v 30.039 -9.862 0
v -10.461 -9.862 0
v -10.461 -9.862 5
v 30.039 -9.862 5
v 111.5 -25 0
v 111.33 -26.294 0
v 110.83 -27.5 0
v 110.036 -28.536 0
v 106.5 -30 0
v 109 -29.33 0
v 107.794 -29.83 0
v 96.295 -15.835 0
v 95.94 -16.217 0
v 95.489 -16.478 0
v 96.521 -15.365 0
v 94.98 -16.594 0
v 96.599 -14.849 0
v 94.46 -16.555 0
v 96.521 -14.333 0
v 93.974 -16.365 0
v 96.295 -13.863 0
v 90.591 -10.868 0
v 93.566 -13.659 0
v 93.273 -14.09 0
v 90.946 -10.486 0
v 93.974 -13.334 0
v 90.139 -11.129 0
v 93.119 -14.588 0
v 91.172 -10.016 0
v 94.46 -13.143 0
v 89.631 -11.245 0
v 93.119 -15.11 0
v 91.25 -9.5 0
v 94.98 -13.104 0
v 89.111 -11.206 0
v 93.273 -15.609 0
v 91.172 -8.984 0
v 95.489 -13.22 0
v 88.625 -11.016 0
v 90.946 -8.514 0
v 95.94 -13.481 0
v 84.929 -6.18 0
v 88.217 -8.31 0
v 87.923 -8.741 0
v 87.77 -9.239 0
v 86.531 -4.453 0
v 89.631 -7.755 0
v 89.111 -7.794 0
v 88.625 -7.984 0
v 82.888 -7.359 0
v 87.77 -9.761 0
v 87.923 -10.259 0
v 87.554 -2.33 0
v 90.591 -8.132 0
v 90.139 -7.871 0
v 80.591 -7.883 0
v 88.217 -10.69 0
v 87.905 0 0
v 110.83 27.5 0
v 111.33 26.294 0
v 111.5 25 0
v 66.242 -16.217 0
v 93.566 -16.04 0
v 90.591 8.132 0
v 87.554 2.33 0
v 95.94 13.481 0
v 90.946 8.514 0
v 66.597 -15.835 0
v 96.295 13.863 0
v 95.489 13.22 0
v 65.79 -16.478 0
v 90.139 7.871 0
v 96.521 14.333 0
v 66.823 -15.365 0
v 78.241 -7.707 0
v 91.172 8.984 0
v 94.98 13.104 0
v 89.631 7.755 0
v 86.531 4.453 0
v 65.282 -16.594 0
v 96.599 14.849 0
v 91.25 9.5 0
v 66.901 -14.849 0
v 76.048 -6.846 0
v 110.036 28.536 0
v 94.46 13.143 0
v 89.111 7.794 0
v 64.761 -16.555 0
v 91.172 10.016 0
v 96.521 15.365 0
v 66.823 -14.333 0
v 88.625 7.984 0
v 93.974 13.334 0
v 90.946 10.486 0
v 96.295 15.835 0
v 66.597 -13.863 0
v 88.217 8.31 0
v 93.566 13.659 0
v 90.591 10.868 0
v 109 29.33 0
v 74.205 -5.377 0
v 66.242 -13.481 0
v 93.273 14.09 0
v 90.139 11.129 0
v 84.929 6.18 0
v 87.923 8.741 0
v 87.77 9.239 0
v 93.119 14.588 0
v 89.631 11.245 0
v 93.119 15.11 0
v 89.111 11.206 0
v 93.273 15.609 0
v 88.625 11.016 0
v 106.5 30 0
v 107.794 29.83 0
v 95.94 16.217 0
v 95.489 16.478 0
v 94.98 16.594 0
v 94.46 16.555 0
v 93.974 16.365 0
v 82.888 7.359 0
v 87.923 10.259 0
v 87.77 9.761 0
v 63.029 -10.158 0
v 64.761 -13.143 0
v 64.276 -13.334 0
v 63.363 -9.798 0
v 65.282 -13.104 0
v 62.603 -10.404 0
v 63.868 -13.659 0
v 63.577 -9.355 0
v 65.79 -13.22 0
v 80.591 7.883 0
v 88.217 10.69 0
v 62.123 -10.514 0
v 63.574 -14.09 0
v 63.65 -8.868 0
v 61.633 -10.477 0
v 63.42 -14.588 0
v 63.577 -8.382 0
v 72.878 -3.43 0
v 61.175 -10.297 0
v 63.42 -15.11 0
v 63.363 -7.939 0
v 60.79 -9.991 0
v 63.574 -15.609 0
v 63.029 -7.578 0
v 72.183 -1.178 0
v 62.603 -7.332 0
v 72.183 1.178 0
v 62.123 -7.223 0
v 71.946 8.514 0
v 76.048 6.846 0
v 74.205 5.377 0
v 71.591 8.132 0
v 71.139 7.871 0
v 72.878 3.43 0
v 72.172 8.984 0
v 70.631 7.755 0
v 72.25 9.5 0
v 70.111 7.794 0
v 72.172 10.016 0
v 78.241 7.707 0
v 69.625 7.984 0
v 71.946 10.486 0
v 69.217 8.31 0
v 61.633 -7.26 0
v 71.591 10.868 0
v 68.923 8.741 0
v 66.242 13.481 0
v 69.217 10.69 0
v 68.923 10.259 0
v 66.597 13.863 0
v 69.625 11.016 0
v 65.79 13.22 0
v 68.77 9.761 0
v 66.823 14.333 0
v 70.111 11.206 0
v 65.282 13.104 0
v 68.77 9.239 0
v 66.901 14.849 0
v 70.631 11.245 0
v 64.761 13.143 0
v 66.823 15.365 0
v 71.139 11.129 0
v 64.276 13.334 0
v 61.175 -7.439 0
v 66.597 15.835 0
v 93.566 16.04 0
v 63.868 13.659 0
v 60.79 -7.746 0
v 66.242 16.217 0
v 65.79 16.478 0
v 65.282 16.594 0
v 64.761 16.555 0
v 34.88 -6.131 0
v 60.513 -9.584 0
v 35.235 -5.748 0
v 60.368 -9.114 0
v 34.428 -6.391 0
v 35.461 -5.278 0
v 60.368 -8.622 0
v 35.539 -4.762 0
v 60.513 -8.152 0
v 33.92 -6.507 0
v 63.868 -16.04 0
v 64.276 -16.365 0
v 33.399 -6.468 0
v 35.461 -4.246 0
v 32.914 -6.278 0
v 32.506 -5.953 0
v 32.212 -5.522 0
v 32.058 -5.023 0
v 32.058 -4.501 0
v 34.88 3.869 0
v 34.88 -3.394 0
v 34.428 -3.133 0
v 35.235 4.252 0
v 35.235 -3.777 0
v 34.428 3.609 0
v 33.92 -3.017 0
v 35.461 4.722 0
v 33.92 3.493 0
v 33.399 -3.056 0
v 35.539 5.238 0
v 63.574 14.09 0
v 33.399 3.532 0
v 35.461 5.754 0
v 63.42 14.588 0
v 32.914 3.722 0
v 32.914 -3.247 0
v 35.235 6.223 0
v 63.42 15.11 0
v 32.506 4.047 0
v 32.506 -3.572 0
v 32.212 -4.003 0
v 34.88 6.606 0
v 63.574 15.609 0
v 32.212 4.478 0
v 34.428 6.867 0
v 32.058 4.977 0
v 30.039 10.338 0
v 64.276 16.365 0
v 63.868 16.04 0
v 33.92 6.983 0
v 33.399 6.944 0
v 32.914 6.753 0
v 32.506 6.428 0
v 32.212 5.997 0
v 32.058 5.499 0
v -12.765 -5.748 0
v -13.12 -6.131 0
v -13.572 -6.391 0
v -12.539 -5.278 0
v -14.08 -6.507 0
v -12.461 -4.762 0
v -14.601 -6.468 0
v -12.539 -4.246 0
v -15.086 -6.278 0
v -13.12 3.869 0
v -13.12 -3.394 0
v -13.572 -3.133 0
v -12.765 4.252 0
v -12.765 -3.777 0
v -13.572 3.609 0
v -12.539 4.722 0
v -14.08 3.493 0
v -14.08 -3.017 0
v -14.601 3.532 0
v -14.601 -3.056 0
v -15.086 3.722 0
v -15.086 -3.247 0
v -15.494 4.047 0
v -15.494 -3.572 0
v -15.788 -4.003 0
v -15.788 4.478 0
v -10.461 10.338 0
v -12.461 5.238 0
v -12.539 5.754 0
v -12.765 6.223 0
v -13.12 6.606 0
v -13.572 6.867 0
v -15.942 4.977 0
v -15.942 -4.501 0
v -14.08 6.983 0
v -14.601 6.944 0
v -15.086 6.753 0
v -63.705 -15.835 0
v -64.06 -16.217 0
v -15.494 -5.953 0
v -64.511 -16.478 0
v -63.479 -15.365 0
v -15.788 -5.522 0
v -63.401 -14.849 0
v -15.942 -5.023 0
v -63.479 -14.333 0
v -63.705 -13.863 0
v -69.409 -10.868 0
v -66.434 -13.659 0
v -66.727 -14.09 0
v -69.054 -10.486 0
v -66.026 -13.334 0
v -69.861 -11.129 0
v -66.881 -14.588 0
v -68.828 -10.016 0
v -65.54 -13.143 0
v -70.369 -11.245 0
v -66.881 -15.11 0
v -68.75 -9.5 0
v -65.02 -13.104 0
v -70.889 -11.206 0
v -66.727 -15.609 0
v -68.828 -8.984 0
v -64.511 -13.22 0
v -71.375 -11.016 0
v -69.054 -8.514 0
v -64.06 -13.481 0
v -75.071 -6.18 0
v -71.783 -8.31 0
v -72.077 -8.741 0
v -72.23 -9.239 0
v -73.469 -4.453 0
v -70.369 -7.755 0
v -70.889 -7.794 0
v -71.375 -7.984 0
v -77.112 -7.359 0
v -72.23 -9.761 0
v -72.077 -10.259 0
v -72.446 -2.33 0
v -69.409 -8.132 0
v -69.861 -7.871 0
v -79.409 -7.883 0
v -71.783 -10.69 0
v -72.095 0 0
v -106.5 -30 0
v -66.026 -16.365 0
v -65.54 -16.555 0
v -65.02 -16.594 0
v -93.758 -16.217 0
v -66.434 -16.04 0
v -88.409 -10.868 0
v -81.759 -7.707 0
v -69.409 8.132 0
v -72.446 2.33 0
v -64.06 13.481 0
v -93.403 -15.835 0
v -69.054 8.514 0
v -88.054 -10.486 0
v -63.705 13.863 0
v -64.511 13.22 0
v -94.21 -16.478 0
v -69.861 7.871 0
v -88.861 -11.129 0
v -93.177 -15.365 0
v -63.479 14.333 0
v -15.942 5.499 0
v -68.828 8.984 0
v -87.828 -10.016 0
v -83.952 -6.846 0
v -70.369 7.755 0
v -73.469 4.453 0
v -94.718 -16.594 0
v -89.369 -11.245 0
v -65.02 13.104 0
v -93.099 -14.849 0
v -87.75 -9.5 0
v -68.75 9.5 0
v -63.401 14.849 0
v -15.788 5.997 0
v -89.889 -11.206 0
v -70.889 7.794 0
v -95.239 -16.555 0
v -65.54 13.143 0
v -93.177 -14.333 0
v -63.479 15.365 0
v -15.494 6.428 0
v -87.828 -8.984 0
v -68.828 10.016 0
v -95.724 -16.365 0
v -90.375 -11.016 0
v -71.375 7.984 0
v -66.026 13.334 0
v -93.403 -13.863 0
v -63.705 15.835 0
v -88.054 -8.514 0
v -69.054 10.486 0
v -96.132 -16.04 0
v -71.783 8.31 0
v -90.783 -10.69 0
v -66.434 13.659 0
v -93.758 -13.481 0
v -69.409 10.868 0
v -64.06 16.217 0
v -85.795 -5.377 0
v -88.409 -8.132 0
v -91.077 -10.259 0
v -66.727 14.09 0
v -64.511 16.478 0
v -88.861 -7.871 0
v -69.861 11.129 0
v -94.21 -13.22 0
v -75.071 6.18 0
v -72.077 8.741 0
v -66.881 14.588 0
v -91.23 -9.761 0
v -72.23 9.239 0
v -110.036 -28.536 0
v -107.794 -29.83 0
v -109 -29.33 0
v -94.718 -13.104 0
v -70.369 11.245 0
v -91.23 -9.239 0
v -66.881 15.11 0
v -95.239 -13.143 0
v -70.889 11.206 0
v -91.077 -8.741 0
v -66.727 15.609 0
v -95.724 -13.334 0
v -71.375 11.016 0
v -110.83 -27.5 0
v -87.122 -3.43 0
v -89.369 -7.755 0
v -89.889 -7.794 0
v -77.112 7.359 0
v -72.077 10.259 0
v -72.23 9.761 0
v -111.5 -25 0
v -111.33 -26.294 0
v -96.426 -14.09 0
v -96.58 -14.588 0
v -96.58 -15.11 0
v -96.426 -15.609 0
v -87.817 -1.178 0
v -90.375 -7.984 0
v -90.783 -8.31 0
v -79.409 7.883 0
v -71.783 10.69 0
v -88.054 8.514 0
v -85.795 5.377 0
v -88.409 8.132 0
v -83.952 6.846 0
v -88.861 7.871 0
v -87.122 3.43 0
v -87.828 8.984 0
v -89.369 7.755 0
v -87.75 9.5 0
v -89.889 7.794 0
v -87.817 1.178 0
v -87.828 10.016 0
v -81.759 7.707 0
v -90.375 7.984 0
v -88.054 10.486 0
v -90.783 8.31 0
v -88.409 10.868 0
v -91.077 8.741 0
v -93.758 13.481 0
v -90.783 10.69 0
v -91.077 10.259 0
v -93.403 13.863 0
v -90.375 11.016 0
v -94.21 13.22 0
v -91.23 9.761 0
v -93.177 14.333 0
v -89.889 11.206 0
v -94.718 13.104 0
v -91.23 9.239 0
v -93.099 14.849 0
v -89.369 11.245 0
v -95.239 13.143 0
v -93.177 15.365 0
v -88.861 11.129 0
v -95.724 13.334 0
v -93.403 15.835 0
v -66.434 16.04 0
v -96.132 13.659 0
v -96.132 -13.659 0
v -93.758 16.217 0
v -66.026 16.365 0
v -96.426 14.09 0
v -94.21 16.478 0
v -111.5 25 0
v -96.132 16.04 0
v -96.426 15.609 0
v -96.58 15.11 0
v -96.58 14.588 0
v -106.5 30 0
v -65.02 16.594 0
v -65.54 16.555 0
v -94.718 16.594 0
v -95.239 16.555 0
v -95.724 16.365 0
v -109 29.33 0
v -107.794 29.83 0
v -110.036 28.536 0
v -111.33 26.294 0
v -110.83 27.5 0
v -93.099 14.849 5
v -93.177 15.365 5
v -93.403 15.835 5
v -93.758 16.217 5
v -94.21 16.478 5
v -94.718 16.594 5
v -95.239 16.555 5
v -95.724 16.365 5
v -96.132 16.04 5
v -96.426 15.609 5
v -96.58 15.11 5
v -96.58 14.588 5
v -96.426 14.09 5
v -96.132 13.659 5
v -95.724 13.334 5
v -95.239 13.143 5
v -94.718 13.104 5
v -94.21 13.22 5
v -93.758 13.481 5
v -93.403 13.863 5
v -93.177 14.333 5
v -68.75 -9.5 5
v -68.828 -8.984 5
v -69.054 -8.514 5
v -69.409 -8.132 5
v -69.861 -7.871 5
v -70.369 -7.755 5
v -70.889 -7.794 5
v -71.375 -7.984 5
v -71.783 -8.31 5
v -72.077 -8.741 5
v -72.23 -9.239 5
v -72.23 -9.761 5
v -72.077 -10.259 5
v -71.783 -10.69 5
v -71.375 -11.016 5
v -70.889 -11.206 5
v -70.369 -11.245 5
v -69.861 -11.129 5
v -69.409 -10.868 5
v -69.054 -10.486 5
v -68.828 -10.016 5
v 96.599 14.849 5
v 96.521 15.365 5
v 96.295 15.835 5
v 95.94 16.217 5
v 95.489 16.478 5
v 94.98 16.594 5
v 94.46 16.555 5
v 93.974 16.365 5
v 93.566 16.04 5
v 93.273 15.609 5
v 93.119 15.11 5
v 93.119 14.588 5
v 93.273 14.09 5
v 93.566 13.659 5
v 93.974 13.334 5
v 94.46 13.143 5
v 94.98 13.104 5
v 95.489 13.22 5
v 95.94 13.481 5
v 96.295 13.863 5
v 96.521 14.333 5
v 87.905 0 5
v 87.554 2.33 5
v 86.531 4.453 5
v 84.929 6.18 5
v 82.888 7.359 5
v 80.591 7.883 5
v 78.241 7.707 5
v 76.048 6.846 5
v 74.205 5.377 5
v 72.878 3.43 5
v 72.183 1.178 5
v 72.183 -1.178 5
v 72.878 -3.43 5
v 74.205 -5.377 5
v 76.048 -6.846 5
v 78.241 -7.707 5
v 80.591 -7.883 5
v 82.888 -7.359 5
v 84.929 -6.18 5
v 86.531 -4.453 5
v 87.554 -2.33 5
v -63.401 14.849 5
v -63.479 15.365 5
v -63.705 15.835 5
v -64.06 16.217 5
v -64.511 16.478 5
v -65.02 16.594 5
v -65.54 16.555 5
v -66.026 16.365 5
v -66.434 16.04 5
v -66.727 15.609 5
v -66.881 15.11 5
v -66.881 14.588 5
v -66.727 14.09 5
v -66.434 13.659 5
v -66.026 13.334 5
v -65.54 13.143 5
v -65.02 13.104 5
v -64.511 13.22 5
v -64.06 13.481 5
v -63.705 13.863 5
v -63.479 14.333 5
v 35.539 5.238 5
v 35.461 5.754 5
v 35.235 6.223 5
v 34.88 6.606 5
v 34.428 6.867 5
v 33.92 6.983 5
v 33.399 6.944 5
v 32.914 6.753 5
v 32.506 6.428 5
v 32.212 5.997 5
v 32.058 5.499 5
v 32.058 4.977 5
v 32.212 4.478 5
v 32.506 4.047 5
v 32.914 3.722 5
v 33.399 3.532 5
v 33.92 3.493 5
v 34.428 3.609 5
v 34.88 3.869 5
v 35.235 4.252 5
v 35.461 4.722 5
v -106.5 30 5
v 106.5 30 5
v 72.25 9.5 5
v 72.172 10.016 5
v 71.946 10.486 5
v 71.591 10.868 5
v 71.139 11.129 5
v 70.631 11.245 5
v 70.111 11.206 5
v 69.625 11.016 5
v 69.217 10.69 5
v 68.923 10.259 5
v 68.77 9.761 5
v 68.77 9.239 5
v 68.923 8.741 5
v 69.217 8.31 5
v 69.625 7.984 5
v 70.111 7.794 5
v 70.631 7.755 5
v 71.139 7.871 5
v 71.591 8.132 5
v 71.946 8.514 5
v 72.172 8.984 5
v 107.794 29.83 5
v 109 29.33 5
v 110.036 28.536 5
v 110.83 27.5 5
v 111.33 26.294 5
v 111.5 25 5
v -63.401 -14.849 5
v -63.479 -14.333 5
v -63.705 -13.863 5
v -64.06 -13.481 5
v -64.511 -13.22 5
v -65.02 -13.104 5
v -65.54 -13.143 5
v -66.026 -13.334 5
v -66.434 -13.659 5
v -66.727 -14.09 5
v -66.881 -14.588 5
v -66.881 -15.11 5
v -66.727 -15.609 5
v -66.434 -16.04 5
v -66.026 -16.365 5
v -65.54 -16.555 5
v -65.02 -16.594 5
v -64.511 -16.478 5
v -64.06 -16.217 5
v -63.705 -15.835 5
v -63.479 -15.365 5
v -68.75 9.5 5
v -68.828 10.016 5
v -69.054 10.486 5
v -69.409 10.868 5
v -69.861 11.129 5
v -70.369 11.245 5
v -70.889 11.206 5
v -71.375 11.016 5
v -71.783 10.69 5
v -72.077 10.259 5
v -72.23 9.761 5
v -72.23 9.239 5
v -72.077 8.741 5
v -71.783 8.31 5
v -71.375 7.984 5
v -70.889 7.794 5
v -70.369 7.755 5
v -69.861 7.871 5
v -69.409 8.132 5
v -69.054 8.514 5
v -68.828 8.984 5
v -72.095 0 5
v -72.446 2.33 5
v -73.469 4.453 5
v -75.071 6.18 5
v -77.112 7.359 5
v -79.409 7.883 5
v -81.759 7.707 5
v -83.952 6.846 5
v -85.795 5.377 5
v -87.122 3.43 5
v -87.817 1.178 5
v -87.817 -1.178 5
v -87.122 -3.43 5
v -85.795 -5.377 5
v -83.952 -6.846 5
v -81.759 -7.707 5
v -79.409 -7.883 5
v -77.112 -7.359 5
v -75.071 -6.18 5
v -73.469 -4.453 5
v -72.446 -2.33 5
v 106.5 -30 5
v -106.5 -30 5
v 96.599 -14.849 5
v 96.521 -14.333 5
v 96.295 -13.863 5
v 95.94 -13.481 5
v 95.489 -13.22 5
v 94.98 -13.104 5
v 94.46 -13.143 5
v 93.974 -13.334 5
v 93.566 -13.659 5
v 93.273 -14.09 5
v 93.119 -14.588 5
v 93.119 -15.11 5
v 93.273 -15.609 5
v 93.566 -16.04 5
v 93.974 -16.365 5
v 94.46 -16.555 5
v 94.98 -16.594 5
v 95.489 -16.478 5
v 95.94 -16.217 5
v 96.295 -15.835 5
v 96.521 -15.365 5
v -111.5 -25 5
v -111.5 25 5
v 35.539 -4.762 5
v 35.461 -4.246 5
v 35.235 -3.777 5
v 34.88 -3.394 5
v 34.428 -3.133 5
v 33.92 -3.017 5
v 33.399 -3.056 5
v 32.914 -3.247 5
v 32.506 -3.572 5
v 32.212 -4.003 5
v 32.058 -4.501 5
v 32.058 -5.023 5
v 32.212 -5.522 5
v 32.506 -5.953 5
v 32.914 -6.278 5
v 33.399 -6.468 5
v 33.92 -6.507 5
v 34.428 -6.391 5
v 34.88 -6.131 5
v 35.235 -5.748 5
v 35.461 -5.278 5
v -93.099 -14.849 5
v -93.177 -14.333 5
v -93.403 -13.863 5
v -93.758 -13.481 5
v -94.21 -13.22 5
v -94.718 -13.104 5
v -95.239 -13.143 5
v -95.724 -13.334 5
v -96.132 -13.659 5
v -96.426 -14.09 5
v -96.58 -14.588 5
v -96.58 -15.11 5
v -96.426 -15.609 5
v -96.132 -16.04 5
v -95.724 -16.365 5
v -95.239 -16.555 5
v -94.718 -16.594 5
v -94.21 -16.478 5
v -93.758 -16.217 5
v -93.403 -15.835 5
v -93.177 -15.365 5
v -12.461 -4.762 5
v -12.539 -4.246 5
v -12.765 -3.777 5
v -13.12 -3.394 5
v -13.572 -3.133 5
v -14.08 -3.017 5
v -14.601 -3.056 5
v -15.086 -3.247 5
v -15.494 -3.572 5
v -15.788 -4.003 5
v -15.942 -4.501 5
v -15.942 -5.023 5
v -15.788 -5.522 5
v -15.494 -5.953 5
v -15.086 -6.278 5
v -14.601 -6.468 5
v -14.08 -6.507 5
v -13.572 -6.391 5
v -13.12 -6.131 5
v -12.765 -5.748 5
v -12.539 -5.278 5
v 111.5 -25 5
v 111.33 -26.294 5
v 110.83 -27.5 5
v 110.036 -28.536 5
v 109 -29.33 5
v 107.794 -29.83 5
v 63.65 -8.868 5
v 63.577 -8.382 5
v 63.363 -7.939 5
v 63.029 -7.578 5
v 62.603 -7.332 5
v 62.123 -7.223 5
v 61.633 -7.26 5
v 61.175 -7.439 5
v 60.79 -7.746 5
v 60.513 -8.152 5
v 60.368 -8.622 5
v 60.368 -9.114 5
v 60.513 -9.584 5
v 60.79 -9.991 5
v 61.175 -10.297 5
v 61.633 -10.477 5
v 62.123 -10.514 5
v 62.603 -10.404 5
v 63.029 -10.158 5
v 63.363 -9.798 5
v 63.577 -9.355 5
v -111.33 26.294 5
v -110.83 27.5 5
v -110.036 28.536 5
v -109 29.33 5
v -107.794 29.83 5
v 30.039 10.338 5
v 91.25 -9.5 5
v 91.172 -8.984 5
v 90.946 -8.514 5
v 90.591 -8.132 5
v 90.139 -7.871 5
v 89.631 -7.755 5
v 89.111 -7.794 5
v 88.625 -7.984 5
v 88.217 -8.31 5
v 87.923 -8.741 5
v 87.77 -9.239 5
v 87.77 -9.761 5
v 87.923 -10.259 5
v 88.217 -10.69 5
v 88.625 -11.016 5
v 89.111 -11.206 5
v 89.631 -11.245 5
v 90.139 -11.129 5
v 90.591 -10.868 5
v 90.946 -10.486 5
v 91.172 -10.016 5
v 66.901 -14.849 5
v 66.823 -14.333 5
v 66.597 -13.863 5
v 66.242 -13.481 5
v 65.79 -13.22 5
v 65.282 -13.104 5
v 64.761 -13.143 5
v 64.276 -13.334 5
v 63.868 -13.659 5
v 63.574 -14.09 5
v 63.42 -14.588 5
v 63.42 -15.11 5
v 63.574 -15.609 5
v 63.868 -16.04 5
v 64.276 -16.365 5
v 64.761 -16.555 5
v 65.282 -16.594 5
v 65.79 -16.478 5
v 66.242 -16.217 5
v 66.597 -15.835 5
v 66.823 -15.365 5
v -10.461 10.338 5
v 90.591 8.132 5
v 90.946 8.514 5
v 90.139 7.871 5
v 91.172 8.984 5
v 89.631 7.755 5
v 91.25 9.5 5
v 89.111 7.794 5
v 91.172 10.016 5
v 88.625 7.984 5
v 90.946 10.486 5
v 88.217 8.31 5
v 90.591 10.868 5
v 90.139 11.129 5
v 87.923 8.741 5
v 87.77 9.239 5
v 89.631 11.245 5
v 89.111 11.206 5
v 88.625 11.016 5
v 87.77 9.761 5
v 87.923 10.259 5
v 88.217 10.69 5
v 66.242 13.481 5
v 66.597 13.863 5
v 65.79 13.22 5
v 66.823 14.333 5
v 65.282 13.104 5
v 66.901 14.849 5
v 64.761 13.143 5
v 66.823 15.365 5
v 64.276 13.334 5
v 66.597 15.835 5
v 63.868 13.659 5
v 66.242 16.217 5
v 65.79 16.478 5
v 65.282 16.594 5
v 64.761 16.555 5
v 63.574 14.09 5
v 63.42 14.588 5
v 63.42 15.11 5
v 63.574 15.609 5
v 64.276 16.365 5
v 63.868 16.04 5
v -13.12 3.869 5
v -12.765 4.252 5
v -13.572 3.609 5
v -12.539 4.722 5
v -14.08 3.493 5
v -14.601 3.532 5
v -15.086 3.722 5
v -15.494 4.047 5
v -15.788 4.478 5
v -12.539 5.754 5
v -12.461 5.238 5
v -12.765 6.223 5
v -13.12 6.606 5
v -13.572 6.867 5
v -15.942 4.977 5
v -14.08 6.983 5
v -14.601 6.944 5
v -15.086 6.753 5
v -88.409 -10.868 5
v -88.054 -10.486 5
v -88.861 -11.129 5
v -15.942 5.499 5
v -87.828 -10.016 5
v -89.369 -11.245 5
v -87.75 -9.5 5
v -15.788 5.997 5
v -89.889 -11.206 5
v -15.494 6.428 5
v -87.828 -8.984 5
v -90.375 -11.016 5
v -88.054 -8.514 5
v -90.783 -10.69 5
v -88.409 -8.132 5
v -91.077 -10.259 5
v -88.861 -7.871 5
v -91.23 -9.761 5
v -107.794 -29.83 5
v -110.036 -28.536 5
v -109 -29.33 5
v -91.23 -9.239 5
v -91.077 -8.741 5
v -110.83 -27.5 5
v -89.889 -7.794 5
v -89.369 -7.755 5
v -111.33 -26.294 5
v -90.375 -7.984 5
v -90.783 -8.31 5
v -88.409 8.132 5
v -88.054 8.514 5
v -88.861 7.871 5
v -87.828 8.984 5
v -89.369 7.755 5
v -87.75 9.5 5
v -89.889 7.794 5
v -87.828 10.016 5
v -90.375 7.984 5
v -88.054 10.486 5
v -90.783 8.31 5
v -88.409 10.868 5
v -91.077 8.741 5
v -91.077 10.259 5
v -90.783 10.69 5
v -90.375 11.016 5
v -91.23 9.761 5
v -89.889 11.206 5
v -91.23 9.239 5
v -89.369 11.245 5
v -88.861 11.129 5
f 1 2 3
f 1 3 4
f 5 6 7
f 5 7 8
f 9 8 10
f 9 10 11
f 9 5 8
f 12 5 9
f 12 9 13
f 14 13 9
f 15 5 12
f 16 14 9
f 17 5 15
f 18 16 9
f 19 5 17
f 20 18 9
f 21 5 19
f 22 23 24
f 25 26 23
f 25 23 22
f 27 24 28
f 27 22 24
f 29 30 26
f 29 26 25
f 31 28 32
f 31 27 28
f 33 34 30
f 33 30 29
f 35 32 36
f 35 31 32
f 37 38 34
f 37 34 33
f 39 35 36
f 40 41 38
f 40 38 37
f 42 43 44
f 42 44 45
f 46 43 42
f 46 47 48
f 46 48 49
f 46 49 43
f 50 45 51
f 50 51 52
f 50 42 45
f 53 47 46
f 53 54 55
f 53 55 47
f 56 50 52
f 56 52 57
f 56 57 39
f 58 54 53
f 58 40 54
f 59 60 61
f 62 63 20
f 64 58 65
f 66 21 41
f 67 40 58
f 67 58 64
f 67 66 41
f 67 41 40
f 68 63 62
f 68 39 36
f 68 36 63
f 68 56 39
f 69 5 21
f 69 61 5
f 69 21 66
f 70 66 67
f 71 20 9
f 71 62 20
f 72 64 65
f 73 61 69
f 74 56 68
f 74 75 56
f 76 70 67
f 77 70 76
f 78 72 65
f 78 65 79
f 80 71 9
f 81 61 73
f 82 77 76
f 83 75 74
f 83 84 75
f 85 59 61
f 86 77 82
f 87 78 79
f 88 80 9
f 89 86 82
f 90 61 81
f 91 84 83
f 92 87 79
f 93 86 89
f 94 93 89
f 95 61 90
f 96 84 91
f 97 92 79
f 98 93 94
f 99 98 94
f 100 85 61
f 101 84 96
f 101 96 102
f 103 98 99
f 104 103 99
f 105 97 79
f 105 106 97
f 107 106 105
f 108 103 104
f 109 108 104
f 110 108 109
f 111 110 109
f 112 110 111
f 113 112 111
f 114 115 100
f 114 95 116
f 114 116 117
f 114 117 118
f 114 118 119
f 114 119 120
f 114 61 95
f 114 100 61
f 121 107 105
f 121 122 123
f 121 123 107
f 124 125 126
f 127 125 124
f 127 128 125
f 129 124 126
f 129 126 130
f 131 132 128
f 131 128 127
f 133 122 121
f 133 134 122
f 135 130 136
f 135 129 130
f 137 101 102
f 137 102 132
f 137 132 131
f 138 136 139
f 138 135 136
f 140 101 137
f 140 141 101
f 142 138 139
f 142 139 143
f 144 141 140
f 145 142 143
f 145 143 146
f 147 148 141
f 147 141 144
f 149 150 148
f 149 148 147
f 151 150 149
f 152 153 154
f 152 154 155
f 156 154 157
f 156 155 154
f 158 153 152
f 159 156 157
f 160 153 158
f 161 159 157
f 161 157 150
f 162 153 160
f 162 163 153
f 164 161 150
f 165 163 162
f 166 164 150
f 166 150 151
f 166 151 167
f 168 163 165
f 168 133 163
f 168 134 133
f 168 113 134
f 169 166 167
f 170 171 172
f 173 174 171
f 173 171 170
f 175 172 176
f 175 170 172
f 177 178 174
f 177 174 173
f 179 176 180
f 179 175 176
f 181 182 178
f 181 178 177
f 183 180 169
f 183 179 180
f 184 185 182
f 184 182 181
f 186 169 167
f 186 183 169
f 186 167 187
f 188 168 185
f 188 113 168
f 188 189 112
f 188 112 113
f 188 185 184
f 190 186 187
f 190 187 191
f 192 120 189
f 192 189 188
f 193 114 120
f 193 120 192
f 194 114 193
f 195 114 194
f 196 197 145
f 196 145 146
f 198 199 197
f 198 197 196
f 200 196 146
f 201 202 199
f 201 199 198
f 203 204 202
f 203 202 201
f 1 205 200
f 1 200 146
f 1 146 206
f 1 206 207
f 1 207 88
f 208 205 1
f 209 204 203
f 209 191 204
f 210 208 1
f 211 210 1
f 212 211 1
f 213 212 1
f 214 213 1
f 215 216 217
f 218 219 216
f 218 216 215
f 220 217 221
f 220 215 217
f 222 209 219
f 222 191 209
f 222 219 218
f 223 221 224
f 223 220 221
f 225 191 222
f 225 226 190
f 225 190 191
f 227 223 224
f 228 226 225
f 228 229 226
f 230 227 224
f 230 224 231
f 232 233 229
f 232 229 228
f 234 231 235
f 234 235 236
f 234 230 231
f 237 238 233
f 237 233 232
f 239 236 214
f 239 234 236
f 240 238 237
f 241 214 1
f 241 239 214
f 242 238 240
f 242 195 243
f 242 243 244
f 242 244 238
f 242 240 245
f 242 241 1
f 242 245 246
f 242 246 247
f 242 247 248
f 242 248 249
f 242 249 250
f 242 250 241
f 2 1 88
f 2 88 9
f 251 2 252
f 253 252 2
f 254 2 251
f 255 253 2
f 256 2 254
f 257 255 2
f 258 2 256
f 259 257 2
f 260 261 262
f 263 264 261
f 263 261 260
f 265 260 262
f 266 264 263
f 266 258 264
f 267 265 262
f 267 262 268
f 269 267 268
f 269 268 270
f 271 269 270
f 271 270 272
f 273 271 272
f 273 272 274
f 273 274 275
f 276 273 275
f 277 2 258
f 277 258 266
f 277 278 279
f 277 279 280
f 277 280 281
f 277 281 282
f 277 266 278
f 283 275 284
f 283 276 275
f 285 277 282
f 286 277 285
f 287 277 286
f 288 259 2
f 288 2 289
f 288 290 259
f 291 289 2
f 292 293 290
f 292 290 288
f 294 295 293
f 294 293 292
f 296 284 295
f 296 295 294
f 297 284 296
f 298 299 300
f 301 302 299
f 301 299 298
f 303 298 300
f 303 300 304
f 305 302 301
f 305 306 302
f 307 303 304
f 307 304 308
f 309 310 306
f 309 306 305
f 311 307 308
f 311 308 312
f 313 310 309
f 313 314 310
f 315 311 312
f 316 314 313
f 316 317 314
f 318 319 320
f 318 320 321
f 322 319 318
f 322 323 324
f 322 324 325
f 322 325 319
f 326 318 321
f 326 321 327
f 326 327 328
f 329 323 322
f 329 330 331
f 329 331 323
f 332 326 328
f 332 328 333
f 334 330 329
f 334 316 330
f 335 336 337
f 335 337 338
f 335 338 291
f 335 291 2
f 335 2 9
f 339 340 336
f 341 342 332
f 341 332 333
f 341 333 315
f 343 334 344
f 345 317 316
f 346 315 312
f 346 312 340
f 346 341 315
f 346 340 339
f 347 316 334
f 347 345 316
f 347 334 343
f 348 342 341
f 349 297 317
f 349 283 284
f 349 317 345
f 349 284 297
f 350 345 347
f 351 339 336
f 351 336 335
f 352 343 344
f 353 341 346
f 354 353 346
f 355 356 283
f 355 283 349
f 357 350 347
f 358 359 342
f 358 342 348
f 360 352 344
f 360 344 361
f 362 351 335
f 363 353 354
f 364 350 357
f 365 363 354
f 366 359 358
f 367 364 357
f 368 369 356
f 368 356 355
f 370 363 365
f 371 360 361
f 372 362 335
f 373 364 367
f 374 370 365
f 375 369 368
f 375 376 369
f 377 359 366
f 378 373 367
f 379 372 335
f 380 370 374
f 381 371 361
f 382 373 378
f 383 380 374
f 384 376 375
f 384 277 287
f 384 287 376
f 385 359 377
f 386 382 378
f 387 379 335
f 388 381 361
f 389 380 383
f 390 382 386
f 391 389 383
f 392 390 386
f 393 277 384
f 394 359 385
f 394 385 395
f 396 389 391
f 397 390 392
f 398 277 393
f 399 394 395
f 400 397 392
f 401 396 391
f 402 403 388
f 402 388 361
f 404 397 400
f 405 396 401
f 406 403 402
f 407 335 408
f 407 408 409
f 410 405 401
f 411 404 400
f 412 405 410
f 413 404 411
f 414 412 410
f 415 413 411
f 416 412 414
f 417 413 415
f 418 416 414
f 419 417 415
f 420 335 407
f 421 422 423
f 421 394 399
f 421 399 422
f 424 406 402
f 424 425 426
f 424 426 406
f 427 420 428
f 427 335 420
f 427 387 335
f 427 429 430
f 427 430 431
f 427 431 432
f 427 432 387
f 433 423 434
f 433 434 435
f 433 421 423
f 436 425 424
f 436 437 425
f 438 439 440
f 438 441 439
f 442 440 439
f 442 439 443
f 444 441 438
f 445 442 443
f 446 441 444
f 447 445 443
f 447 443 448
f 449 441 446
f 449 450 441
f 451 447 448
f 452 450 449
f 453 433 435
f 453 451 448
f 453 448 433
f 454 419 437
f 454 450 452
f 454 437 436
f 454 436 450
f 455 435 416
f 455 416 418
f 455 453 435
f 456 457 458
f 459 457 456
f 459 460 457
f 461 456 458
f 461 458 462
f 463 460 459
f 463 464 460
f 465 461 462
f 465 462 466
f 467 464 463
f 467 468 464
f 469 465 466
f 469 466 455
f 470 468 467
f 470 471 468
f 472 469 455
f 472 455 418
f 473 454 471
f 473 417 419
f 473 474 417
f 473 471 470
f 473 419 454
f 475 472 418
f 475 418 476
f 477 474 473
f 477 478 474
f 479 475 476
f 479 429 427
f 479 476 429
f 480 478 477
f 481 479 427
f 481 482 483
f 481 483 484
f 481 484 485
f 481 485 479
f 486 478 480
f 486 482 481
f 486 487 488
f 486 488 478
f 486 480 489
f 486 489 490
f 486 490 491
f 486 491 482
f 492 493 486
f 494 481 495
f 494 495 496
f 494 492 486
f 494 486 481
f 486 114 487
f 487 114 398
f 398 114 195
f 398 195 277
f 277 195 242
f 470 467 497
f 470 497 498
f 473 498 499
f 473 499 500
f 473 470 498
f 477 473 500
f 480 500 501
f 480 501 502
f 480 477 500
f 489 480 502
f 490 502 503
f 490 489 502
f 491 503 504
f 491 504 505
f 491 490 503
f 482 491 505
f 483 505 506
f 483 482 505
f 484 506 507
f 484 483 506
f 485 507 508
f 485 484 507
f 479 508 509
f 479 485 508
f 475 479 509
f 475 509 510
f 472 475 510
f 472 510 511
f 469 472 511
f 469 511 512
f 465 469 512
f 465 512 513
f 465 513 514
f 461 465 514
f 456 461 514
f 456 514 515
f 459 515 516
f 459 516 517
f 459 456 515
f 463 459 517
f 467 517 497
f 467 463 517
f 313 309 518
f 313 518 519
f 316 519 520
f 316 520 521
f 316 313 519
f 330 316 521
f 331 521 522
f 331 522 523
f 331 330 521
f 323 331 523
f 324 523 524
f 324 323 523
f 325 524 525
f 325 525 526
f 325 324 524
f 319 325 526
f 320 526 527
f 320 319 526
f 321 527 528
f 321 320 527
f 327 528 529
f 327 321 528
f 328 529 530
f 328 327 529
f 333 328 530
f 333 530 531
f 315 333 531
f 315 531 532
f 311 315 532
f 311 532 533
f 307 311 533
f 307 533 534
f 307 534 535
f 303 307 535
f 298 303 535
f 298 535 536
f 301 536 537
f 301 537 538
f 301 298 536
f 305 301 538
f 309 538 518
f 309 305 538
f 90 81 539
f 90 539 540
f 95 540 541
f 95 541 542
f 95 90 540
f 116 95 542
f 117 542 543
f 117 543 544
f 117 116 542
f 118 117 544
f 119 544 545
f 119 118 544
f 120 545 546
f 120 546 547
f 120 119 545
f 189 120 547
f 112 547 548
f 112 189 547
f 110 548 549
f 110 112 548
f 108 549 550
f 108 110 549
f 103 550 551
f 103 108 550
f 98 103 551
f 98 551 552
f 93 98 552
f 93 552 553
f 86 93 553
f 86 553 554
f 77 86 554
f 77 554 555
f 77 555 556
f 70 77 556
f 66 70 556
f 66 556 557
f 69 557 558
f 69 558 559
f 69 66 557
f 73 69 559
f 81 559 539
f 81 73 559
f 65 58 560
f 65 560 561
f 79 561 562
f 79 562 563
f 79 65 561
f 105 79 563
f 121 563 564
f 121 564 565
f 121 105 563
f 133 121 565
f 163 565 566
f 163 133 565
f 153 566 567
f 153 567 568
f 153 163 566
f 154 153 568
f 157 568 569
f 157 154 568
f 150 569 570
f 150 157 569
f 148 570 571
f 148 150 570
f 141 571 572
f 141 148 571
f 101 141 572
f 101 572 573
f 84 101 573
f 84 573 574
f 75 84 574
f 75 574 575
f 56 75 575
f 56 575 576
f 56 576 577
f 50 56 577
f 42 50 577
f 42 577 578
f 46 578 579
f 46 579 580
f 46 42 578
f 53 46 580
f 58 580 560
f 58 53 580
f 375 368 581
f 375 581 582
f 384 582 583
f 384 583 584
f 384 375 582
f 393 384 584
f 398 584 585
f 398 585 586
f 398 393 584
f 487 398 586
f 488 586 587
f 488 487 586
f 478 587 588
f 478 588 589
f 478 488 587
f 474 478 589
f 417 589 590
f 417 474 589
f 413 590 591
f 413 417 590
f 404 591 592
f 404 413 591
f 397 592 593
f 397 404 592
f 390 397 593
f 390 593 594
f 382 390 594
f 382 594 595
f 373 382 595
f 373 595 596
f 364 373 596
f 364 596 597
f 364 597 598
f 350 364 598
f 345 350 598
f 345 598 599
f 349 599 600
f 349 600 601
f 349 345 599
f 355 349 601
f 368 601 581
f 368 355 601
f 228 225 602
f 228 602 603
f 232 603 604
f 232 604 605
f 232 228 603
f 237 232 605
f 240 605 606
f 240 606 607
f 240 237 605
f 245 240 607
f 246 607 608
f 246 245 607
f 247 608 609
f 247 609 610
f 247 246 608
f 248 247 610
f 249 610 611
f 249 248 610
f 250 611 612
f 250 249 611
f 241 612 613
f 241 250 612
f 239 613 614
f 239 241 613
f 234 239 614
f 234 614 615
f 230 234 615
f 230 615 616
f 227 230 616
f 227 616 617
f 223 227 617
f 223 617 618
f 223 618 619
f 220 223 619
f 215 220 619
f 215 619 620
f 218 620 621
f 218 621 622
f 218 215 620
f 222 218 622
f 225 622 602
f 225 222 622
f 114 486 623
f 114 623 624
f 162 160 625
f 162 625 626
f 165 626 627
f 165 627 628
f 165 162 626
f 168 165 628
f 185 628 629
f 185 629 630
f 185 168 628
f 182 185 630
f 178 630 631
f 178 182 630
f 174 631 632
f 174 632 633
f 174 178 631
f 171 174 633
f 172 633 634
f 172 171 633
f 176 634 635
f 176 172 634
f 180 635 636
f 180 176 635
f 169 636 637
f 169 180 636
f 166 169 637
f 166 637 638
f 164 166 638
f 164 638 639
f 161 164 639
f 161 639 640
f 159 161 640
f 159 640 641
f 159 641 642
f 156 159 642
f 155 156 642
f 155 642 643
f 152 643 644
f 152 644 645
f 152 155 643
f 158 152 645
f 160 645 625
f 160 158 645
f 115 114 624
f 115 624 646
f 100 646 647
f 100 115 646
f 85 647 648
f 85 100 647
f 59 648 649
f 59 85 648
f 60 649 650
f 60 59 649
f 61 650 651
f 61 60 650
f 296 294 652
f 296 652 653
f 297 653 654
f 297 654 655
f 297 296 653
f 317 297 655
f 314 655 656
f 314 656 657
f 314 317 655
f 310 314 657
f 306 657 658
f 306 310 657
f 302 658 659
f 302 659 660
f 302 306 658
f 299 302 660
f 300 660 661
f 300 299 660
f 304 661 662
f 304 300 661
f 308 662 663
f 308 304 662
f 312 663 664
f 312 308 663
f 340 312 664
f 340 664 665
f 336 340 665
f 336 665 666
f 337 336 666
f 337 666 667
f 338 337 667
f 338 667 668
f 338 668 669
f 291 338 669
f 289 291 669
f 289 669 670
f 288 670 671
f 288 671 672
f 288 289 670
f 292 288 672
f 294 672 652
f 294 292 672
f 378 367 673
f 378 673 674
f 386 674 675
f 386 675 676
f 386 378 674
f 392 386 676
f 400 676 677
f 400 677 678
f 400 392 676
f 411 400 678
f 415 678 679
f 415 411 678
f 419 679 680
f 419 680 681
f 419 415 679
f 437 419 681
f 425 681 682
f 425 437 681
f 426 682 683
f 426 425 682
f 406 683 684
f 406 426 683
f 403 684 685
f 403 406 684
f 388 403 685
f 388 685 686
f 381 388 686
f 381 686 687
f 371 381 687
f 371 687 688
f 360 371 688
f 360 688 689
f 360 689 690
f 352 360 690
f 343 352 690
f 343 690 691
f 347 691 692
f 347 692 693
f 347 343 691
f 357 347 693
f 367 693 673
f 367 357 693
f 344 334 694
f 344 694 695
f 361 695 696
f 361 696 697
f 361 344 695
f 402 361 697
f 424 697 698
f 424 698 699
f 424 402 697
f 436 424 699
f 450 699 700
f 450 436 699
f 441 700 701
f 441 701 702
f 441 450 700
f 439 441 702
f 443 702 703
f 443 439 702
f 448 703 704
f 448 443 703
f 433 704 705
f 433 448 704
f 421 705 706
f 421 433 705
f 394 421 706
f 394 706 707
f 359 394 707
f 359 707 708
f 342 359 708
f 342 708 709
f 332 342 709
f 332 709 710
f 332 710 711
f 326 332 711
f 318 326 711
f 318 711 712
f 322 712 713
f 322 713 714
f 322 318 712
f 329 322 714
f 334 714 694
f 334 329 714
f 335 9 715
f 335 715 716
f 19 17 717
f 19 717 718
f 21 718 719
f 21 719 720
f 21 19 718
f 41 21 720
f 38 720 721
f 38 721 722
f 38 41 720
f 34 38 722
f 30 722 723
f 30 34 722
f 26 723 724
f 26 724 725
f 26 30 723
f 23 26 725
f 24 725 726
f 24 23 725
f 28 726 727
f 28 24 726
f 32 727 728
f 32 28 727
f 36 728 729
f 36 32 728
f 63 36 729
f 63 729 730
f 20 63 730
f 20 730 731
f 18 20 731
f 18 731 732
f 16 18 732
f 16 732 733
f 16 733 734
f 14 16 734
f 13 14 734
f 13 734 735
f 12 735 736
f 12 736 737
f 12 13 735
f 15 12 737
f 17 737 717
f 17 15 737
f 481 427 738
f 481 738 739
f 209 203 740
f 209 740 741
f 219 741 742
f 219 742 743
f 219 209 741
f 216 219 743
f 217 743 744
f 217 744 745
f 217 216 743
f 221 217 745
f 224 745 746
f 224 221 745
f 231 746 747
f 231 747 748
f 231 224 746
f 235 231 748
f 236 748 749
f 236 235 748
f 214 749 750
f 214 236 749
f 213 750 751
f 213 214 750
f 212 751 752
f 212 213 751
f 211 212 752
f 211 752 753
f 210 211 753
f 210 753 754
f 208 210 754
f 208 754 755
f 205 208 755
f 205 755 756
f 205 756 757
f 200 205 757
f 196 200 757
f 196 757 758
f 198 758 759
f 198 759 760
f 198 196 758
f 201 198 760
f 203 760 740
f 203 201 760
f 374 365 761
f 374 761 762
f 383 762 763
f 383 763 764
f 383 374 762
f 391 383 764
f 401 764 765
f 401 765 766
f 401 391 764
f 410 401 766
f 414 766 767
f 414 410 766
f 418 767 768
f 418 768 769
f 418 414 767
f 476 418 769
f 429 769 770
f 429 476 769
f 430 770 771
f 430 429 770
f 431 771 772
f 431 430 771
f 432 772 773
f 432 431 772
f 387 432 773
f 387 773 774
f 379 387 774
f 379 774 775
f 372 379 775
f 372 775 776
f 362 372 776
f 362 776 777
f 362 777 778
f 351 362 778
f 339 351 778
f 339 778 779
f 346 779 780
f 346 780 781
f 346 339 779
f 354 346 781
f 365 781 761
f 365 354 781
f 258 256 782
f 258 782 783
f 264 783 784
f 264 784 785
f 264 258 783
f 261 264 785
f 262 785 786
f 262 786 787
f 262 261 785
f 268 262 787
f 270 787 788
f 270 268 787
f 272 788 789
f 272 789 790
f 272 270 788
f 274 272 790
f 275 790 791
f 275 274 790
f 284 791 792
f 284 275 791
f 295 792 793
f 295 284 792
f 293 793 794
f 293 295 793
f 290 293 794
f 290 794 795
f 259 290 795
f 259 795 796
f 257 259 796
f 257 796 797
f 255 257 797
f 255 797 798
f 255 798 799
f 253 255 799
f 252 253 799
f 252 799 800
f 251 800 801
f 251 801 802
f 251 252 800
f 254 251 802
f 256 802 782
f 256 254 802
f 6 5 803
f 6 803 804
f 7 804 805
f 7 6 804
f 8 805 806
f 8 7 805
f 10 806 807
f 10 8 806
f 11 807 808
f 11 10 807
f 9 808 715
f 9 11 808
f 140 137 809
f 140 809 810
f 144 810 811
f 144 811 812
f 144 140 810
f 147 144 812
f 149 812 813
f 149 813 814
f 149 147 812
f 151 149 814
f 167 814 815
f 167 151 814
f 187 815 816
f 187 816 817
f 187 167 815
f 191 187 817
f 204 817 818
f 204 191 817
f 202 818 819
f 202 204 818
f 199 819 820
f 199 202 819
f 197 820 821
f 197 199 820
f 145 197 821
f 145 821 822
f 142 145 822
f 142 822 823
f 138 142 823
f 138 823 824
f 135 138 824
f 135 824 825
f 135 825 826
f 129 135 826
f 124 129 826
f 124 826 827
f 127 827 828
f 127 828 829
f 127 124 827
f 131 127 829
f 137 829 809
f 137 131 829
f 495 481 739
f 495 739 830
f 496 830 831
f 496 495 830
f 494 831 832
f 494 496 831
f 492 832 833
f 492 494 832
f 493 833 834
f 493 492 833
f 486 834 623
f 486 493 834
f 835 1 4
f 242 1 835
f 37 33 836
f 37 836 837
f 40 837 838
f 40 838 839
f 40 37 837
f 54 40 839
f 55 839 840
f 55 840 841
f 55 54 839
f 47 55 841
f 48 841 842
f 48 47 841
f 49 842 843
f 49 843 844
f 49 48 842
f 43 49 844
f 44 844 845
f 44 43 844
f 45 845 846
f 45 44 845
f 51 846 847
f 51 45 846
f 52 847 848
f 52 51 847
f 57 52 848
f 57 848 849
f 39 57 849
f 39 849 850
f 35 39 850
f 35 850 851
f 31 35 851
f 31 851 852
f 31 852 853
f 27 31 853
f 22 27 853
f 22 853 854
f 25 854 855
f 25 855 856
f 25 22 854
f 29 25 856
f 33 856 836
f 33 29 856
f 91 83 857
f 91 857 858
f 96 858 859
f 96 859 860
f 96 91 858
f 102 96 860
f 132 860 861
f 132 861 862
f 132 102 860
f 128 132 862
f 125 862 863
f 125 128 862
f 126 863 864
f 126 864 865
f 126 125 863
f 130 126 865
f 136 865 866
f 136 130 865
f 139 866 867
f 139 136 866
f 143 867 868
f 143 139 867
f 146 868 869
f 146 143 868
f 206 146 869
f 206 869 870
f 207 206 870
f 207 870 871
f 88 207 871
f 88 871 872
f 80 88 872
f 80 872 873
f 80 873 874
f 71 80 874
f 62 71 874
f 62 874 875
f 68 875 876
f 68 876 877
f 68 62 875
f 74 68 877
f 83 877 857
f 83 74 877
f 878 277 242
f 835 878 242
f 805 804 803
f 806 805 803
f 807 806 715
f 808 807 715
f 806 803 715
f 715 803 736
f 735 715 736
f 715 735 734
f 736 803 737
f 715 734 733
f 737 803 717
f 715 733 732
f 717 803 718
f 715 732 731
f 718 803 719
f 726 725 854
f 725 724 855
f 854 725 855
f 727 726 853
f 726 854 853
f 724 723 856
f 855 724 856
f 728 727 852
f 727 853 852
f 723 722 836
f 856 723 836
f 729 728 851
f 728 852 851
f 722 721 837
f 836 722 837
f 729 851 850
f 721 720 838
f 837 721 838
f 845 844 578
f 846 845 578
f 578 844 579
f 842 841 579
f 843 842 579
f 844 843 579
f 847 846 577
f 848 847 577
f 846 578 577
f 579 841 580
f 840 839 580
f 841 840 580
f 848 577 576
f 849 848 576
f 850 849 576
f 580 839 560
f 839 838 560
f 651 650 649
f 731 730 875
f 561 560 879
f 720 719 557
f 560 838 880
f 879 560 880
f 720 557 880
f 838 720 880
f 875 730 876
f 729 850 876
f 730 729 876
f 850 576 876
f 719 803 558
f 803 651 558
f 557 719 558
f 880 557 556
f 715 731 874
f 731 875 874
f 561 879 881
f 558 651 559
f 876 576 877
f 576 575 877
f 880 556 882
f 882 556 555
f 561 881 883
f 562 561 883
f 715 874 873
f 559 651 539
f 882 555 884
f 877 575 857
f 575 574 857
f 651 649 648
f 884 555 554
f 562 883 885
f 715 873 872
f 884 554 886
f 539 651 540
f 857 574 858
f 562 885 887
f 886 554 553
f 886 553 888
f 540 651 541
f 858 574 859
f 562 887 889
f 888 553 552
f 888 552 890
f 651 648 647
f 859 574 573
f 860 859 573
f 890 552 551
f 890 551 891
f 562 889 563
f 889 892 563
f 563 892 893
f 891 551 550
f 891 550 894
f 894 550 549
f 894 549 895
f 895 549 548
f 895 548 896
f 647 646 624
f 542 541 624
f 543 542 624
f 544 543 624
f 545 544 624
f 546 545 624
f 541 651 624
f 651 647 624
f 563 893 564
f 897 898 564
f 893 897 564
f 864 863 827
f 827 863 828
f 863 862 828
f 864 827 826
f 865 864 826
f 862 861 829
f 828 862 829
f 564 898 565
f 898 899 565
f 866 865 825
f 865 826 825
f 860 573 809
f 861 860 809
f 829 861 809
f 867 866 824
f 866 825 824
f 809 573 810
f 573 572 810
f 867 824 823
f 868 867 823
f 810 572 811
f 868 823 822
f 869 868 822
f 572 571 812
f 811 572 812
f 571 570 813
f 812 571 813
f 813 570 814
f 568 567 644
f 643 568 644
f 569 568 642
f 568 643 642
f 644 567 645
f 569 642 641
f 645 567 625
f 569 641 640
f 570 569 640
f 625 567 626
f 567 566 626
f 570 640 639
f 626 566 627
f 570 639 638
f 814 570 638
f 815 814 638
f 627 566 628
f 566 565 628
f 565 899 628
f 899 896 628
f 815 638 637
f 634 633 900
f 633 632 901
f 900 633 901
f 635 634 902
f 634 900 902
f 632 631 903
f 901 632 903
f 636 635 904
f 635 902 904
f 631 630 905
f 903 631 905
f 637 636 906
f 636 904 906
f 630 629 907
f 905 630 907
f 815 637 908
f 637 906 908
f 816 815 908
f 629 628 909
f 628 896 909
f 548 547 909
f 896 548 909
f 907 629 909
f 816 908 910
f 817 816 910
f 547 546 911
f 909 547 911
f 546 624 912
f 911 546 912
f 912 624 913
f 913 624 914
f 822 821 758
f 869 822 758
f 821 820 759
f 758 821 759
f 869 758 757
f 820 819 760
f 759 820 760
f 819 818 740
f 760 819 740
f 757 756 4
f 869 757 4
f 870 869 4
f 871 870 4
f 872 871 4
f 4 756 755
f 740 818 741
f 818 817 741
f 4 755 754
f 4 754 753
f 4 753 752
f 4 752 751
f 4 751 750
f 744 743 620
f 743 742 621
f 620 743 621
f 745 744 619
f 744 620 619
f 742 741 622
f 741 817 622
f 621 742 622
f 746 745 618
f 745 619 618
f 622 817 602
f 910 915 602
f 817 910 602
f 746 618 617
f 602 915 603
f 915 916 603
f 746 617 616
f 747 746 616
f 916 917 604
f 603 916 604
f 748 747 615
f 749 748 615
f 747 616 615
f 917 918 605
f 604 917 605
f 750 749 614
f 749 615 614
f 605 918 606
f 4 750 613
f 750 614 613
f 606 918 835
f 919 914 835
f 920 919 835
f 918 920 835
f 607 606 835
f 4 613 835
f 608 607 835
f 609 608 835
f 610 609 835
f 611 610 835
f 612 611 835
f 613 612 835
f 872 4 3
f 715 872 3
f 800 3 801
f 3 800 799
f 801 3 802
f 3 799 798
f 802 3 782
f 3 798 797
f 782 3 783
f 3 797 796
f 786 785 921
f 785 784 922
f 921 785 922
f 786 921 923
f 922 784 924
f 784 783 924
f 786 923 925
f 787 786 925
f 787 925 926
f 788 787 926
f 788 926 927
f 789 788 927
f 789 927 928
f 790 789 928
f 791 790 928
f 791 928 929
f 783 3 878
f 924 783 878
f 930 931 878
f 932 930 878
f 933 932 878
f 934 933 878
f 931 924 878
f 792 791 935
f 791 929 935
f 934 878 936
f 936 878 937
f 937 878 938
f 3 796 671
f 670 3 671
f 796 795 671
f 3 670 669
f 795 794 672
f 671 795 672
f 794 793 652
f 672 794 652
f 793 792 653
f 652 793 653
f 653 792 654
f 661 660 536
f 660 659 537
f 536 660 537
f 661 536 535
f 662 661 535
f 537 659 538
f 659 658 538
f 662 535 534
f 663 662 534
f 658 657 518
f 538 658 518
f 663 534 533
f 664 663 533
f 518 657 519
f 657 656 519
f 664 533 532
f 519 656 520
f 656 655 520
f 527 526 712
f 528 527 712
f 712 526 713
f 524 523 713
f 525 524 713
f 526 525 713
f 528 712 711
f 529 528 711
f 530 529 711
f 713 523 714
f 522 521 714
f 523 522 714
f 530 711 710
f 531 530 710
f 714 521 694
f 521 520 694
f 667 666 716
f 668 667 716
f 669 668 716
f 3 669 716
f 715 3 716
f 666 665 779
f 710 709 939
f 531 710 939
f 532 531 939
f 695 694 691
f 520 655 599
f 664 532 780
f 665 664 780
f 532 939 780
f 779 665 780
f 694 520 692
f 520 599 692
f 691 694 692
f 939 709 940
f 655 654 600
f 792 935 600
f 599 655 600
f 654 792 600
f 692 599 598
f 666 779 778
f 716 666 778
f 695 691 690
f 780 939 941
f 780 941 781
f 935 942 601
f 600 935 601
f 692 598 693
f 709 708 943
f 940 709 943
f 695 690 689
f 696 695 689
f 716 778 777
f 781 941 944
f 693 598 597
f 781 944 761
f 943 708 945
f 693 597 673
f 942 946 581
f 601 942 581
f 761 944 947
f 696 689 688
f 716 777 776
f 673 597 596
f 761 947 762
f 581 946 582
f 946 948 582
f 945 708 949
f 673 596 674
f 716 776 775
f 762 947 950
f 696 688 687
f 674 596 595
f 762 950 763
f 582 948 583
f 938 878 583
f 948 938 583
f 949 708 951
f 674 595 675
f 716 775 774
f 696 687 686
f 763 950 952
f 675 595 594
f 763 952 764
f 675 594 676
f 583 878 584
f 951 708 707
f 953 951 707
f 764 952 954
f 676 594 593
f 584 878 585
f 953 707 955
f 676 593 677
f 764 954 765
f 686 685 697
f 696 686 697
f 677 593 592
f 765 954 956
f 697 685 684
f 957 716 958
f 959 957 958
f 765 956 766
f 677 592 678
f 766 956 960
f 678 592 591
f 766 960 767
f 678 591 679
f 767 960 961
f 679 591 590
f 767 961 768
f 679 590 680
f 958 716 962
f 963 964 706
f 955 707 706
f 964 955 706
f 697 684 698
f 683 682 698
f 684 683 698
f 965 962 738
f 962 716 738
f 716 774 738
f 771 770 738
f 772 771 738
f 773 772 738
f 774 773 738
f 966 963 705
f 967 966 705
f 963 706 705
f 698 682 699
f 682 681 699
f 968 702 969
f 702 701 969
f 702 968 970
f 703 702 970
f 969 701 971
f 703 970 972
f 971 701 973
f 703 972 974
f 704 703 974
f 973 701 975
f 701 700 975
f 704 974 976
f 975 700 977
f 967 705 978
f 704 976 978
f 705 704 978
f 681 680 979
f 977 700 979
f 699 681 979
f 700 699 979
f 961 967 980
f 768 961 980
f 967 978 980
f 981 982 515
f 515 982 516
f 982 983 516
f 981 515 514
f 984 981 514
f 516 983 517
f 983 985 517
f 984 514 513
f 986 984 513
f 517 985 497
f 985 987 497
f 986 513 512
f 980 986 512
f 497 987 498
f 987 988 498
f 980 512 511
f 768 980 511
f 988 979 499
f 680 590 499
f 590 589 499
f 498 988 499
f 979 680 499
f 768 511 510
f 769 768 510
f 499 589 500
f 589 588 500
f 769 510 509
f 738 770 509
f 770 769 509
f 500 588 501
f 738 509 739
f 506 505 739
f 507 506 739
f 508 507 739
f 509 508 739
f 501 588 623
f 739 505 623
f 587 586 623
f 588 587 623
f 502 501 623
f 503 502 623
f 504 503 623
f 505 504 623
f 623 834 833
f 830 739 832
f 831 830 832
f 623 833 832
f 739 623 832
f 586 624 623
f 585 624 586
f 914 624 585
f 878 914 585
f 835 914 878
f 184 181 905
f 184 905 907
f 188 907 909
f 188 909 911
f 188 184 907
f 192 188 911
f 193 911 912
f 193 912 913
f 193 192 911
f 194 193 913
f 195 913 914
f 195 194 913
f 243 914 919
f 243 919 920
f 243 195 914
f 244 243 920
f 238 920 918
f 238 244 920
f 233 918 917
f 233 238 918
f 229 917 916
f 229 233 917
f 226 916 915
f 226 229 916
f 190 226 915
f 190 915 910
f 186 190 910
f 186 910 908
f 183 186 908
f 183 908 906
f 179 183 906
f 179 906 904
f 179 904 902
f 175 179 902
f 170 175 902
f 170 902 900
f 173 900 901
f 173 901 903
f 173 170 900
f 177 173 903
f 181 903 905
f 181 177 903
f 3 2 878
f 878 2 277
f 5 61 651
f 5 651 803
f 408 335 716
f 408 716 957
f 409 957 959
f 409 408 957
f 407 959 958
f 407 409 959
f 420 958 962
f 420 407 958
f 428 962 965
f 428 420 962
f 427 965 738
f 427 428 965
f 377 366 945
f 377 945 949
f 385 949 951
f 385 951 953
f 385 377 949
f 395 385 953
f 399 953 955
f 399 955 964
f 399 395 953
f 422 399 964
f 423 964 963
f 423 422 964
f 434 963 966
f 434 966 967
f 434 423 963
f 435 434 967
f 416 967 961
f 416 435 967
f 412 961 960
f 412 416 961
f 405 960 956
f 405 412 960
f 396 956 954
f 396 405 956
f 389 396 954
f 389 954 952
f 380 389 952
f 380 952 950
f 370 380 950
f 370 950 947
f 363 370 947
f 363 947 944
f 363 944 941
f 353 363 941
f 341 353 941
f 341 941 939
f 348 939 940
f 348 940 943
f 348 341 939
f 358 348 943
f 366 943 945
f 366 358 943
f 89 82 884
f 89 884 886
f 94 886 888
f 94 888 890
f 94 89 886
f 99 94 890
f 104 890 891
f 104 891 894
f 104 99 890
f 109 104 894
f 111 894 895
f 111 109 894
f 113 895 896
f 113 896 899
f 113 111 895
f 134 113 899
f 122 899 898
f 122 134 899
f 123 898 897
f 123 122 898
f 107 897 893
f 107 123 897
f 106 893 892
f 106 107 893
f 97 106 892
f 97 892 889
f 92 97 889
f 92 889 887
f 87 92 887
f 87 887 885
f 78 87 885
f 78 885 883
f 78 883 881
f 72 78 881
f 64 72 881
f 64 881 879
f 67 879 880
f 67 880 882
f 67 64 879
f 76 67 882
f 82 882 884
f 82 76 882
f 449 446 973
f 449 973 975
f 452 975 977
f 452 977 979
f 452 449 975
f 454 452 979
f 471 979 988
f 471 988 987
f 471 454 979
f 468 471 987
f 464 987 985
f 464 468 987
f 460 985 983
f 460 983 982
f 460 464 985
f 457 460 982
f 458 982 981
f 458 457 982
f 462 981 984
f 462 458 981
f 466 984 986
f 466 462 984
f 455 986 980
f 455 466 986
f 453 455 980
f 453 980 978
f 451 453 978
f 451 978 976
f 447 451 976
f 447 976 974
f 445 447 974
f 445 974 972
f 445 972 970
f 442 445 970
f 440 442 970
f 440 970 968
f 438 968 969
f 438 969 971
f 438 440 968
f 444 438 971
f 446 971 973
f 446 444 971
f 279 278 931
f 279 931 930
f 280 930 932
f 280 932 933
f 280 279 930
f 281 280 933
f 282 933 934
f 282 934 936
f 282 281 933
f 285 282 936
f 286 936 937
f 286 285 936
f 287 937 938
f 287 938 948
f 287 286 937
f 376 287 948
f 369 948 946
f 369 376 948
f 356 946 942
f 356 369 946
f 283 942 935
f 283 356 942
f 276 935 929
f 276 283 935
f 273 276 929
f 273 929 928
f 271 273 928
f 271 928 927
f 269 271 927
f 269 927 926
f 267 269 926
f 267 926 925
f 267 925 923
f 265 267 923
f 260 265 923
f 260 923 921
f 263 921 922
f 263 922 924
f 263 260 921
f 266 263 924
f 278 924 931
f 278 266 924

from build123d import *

# Parameters (mm, degrees)
SKETCH_1_R      = 7.905
SKETCH_1_R_2    = 1.75
SKETCH_1_R_3    = 1.65
SKETCH_1_W      = 40.5
SKETCH_1_H      = 20.2
EXTRUDE_1_DEPTH = 5


with BuildPart() as part:
    # 草图1 → 凸台-拉伸1 (new body)
    with BuildSketch(Plane.XY):
        with BuildLine():
            Line((106.5, -30), (-106.5, -30))
            ThreePointArc((-106.5, -30), (-110.035533906, -28.535533906), (-111.5, -25))
            Line((-111.5, -25), (-111.5, 25))
            ThreePointArc((-111.5, 25), (-110.035533906, 28.535533906), (-106.5, 30))
            Line((-106.5, 30), (106.5, 30))
            ThreePointArc((106.5, 30), (110.035533906, 28.535533906), (111.5, 25))
            Line((111.5, 25), (111.5, -25))
            ThreePointArc((111.5, -25), (110.035533906, -28.535533906), (106.5, -30))
        make_face()
        with Locations((-80, 0)):
            Circle(SKETCH_1_R, mode=Mode.SUBTRACT)
        with Locations((80, 0)):
            Circle(SKETCH_1_R, mode=Mode.SUBTRACT)
        with Locations((33.788860906, -4.762314657)):
            Circle(SKETCH_1_R_2, mode=Mode.SUBTRACT)
        with Locations((33.788860906, 5.237685343)):
            Circle(SKETCH_1_R_2, mode=Mode.SUBTRACT)
        with Locations((-14.211139094, -4.762314657)):
            Circle(SKETCH_1_R_2, mode=Mode.SUBTRACT)
        with Locations((-14.211139094, 5.237685343)):
            Circle(SKETCH_1_R_2, mode=Mode.SUBTRACT)
        with Locations((-94.849242405, 14.849242405)):
            Circle(SKETCH_1_R_2, mode=Mode.SUBTRACT)
        with Locations((-94.849242405, -14.849242405)):
            Circle(SKETCH_1_R_2, mode=Mode.SUBTRACT)
        with Locations((-65.150757595, 14.849242405)):
            Circle(SKETCH_1_R_2, mode=Mode.SUBTRACT)
        with Locations((-65.150757595, -14.849242405)):
            Circle(SKETCH_1_R_2, mode=Mode.SUBTRACT)
        with Locations((65.150757595, -14.849242405)):
            Circle(SKETCH_1_R_2, mode=Mode.SUBTRACT)
        with Locations((94.849242405, -14.849242405)):
            Circle(SKETCH_1_R_2, mode=Mode.SUBTRACT)
        with Locations((65.150757595, 14.849242405)):
            Circle(SKETCH_1_R_2, mode=Mode.SUBTRACT)
        with Locations((94.849242405, 14.849242405)):
            Circle(SKETCH_1_R_2, mode=Mode.SUBTRACT)
        with Locations((-89.5, 9.5)):
            Circle(SKETCH_1_R_2, mode=Mode.SUBTRACT)
        with Locations((-89.5, -9.5)):
            Circle(SKETCH_1_R_2, mode=Mode.SUBTRACT)
        with Locations((-70.5, 9.5)):
            Circle(SKETCH_1_R_2, mode=Mode.SUBTRACT)
        with Locations((-70.5, -9.5)):
            Circle(SKETCH_1_R_2, mode=Mode.SUBTRACT)
        with Locations((89.5, -9.5)):
            Circle(SKETCH_1_R_2, mode=Mode.SUBTRACT)
        with Locations((62, -8.868327509)):
            Circle(SKETCH_1_R_3, mode=Mode.SUBTRACT)
        with Locations((70.5, 9.5)):
            Circle(SKETCH_1_R_2, mode=Mode.SUBTRACT)
        with Locations((89.5, 9.5)):
            Circle(SKETCH_1_R_2, mode=Mode.SUBTRACT)
        with Locations((9.788860906, 0.237685343)):
            Rectangle(SKETCH_1_W, SKETCH_1_H, mode=Mode.SUBTRACT)
    extrude(amount=EXTRUDE_1_DEPTH)


solid = part.part
